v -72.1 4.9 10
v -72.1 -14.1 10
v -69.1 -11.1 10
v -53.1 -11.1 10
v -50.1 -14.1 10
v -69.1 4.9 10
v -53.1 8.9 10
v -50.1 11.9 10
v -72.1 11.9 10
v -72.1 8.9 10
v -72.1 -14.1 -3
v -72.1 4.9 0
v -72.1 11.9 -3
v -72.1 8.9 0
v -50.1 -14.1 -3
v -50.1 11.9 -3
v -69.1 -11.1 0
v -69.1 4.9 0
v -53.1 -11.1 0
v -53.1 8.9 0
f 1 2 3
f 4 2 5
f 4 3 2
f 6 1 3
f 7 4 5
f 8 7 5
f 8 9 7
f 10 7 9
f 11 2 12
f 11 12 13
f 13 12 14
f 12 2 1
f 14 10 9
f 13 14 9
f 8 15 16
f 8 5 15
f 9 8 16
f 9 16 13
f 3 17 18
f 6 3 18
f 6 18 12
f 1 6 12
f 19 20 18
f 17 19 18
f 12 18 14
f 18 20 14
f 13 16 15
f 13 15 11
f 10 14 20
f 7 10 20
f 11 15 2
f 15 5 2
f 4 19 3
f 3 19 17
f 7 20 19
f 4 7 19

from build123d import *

# Parameters (mm, degrees)
BOSS_EXTRUDE1_DEPTH = 10
SKETCH2_W           = 22
SKETCH2_H           = 26
BOSS_EXTRUDE2_DEPTH = 3


with BuildPart() as part:
    # Sketch1 → Boss-Extrude1 (new body)
    with BuildSketch(Plane.XY):
        Polygon((-72.1, 8.9), (-53.1, 8.9), (-53.1, -11.1), (-69.1, -11.1), (-69.1, 4.9), (-72.1, 4.9), (-72.1, -14.1), (-50.1, -14.1), (-50.1, 11.9), (-72.1, 11.9), align=None)
    extrude(amount=BOSS_EXTRUDE1_DEPTH)

    # Sketch2 → Boss-Extrude2 (add)
    with BuildSketch(Plane(origin=(0, 0, 0), x_dir=(-1, 0, 0), z_dir=(0, 0, -1))):
        with Locations((61.1, -1.1)):
            Rectangle(SKETCH2_W, SKETCH2_H)
    extrude(amount=BOSS_EXTRUDE2_DEPTH)


solid = part.part
